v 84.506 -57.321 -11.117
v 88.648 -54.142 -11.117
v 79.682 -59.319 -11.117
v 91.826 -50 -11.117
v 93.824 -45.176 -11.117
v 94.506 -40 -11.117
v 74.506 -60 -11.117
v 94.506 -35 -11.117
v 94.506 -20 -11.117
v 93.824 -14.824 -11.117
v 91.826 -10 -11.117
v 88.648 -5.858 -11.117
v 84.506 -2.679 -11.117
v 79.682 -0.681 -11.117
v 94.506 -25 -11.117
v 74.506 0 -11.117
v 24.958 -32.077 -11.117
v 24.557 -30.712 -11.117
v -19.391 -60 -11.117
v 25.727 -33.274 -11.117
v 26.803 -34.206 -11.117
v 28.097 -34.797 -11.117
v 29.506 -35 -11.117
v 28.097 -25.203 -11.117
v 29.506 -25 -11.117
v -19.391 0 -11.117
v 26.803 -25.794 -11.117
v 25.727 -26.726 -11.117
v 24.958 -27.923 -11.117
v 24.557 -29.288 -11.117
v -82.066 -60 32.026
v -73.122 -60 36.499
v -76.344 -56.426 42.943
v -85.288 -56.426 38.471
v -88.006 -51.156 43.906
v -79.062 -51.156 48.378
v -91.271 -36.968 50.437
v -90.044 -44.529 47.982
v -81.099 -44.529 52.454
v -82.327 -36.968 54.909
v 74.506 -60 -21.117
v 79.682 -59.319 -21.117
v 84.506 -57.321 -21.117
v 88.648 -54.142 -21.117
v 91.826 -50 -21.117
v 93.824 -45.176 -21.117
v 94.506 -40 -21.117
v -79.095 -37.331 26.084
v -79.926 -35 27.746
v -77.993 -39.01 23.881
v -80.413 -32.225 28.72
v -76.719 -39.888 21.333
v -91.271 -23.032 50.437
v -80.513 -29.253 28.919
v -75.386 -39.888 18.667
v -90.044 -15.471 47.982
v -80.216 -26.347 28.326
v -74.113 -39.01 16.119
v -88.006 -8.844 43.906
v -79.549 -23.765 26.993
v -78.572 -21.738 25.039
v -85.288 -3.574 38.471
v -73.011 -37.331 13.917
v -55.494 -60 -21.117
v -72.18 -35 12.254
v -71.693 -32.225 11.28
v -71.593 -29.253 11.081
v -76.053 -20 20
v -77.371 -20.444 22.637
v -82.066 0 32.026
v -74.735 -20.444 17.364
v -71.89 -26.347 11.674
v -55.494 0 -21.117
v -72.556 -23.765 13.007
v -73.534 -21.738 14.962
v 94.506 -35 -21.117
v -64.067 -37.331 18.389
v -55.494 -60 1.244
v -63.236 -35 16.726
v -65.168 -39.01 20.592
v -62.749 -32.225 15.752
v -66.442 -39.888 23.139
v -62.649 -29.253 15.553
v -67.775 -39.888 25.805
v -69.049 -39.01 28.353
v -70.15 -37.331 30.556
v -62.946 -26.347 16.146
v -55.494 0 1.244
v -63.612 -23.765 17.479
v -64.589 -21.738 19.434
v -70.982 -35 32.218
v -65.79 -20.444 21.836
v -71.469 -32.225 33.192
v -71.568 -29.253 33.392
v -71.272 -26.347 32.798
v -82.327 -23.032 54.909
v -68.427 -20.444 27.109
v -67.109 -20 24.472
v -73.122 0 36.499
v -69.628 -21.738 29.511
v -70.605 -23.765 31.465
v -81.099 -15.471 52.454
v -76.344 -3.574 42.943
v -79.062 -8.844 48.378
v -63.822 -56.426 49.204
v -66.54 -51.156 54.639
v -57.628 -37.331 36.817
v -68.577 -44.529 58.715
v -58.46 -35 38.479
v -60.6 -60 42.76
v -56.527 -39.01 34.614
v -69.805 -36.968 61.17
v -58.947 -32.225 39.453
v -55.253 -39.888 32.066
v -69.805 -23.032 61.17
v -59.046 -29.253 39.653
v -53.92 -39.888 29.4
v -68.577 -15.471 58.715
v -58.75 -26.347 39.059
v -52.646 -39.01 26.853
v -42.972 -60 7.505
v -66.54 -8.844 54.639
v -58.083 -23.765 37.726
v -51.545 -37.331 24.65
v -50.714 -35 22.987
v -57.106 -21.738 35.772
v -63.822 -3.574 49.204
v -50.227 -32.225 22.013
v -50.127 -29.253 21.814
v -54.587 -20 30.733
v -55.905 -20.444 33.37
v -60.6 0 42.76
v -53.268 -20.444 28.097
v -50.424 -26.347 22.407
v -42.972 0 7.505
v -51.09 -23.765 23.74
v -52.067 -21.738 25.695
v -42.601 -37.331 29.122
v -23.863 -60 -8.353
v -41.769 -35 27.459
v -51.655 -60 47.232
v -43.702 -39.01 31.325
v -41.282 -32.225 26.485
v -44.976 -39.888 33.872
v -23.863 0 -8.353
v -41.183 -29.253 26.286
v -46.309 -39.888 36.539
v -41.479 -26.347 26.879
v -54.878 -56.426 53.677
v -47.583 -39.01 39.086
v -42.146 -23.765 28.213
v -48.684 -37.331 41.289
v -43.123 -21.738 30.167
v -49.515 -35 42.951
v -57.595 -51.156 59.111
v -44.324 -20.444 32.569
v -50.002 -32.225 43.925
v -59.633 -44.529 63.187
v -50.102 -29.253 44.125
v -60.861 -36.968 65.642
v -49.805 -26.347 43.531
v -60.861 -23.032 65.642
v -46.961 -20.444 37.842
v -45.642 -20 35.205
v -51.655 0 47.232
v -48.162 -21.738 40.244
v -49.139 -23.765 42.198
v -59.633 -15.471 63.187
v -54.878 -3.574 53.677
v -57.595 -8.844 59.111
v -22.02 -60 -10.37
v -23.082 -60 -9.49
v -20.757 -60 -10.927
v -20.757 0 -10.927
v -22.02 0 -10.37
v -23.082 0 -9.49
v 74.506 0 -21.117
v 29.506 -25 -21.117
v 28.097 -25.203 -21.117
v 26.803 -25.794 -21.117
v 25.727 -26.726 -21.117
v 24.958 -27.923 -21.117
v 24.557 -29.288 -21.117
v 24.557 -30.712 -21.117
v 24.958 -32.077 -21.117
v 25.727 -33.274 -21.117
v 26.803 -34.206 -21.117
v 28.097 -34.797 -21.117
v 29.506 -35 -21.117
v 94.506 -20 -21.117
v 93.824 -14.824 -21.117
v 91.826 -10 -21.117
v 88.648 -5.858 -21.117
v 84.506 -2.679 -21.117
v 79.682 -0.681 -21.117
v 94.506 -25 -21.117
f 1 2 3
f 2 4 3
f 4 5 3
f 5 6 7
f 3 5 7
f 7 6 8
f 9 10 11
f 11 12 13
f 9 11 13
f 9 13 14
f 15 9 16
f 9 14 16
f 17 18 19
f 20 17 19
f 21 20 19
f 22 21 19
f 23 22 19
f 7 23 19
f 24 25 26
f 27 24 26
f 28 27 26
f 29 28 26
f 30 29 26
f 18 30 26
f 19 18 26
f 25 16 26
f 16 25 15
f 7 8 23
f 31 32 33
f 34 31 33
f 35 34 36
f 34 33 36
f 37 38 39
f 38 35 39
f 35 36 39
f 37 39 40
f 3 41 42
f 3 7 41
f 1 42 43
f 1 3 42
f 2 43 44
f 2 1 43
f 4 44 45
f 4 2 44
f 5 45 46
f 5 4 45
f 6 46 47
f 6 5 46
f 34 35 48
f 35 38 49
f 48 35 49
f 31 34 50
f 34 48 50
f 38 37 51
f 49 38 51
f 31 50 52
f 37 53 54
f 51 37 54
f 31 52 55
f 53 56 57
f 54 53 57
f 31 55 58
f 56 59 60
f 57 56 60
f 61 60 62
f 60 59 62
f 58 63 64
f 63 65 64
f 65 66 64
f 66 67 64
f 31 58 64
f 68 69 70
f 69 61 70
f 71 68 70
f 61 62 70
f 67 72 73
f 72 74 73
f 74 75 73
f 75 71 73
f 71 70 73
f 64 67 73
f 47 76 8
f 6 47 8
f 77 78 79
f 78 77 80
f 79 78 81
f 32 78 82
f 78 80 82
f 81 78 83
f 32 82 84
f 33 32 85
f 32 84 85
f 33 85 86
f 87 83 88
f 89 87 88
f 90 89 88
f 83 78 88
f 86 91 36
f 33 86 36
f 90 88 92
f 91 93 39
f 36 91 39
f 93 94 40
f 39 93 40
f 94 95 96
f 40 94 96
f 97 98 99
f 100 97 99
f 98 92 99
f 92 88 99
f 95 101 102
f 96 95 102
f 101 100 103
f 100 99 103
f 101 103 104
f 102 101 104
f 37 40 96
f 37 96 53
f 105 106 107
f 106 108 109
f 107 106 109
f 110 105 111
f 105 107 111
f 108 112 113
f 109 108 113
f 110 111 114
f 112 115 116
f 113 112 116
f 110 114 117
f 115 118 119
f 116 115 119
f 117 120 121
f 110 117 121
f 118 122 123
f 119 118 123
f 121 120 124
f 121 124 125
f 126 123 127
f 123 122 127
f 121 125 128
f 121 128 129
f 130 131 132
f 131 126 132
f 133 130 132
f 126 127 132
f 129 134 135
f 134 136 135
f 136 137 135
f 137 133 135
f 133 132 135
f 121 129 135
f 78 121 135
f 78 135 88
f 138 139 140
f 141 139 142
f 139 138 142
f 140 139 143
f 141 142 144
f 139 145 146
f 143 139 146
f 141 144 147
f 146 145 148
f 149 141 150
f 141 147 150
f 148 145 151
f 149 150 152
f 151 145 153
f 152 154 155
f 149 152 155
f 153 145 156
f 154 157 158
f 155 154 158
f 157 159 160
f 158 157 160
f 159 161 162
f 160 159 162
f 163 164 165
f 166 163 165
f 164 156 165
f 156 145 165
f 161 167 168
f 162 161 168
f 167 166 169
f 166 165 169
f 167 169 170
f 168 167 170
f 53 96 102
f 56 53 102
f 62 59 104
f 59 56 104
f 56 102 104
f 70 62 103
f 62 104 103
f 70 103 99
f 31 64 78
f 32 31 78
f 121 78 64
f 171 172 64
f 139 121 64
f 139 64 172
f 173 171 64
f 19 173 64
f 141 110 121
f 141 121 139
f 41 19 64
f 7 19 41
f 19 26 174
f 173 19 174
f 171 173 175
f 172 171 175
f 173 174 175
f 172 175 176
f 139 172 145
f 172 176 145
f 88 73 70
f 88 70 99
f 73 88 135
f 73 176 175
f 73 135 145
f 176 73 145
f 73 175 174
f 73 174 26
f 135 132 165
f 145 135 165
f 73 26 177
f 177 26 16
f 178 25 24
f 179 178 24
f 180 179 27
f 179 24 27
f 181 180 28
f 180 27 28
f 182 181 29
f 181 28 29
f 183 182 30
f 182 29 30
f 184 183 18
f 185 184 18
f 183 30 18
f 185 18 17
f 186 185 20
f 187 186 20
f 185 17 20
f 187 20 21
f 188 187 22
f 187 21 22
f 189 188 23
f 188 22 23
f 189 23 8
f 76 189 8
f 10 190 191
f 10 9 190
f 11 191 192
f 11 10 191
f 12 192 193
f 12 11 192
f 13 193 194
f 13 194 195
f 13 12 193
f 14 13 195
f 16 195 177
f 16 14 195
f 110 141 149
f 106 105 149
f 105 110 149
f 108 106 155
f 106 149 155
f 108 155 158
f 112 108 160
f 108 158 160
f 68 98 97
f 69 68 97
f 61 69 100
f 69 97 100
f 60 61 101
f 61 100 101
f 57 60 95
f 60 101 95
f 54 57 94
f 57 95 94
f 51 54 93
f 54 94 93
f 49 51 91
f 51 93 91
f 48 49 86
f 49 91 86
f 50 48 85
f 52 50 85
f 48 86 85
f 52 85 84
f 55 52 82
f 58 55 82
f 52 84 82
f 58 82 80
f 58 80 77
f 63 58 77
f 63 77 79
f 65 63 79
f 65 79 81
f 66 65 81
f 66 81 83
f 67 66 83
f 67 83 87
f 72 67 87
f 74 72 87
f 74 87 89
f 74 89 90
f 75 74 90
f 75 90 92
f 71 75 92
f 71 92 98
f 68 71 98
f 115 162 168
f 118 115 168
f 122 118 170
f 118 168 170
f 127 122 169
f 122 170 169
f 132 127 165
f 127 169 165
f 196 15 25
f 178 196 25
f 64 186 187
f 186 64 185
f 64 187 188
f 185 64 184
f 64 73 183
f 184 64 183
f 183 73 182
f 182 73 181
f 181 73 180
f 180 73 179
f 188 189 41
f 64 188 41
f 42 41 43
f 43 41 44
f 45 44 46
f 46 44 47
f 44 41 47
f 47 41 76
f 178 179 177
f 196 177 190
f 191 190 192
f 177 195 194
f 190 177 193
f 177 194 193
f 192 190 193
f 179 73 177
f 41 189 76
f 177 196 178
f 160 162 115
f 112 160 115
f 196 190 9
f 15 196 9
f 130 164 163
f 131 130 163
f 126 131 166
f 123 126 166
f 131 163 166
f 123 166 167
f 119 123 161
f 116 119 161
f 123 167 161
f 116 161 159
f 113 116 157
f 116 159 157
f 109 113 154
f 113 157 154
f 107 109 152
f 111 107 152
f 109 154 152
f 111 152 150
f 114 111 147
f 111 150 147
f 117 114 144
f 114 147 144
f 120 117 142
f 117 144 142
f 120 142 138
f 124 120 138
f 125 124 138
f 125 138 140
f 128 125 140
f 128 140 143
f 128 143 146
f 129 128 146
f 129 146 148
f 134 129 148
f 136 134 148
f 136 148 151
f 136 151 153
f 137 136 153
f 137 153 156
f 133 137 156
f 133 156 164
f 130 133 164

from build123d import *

# Parameters (mm, degrees)
F1_DEPTH = 60
F3_DEPTH = 25
F4_R     = 10
F5_DEPTH = 50.8
F7_DEPTH = 42.5
F8_R     = 20


with BuildPart() as f1:
    # F0 (on Front) → F1 (new body)
    with BuildSketch(Plane.XZ):
        with BuildLine():
            Line((94.505748464, -21.1170856844), (94.505748464, -11.1170856844))
            Line((94.505748464, -11.1170856844), (-19.3909259748, -11.1170856844))
            ThreePointArc((-19.3909259748, -11.1170856844), (-22.0195815354, -10.3703397262), (-23.8630619298, -8.3531536619))
            Line((-23.8630619298, -8.3531536619), (-60.860814682, 65.6423518426))
            Line((-60.860814682, 65.6423518426), (-69.805086592, 61.1702158876))
            Line((-69.805086592, 61.1702158876), (-42.972270862, 7.5045844276))
            Line((-42.972270862, 7.5045844276), (-55.494251536, 1.2435940906))
            Line((-55.494251536, 1.2435940906), (-82.327067266, 54.9092255506))
            Line((-82.327067266, 54.9092255506), (-91.271339176, 50.4370895956))
            Line((-91.271339176, 50.4370895956), (-55.494251536, -21.1170856844))
            Line((-55.494251536, -21.1170856844), (94.505748464, -21.1170856844))
        make_face()
    extrude(amount=F1_DEPTH)

    # F2 (on face) → F3 (cut)
    with BuildSketch(Plane.XY.offset(-11.1170856844)):
        with BuildLine():
            Line((94.505748464, -25), (29.505748464, -25))
            ThreePointArc((29.505748464, -25), (24.505748464, -30), (29.505748464, -35))
            Line((29.505748464, -35), (94.505748464, -35))
            Line((94.505748464, -35), (94.505748464, -25))
        make_face()
    extrude(amount=-F3_DEPTH, mode=Mode.SUBTRACT)

    # F4 (on face) → F5 (cut)
    with BuildSketch(Plane(origin=(-22.4317110086, 0, -11.2158555043), x_dir=(0, 1, 0), z_dir=(0.894427191, 0, 0.4472135955))):
        with Locations((-30, 51.9005979594)):
            Circle(F4_R)
    extrude(amount=-F5_DEPTH, mode=Mode.SUBTRACT)

    # F6 (on face) → F7 (cut)
    with BuildSketch(Plane(origin=(-22.4317110086, 0, -11.2158555043), x_dir=(0, 1, 0), z_dir=(0.894427191, 0, 0.4472135955))):
        with BuildLine():
            ThreePointArc((-23.0317006599, 85.9300881282), (-8.8437530091, 78.6280740539), (0, 65.346308328))
            Line((0, 65.346308328), (0, 85.9300881282))
            Line((0, 85.9300881282), (-23.0317006599, 85.9300881282))
        make_face()
        with BuildLine():
            ThreePointArc((-60, 65.346308328), (-51.1562469909, 78.6280740539), (-36.9682993401, 85.9300881282))
            Line((-36.9682993401, 85.9300881282), (-60, 85.9300881282))
            Line((-60, 85.9300881282), (-60, 65.346308328))
        make_face()
    extrude(amount=-F7_DEPTH, mode=Mode.SUBTRACT)

    # F8
    f8_edges = [f1.edges().sort_by_distance(p)[0] for p in [
        (94.505748, 0, -16.117086),
        (94.505748, -60, -16.117086),
    ]]
    fillet(f8_edges, radius=F8_R)


solid = f1.part
